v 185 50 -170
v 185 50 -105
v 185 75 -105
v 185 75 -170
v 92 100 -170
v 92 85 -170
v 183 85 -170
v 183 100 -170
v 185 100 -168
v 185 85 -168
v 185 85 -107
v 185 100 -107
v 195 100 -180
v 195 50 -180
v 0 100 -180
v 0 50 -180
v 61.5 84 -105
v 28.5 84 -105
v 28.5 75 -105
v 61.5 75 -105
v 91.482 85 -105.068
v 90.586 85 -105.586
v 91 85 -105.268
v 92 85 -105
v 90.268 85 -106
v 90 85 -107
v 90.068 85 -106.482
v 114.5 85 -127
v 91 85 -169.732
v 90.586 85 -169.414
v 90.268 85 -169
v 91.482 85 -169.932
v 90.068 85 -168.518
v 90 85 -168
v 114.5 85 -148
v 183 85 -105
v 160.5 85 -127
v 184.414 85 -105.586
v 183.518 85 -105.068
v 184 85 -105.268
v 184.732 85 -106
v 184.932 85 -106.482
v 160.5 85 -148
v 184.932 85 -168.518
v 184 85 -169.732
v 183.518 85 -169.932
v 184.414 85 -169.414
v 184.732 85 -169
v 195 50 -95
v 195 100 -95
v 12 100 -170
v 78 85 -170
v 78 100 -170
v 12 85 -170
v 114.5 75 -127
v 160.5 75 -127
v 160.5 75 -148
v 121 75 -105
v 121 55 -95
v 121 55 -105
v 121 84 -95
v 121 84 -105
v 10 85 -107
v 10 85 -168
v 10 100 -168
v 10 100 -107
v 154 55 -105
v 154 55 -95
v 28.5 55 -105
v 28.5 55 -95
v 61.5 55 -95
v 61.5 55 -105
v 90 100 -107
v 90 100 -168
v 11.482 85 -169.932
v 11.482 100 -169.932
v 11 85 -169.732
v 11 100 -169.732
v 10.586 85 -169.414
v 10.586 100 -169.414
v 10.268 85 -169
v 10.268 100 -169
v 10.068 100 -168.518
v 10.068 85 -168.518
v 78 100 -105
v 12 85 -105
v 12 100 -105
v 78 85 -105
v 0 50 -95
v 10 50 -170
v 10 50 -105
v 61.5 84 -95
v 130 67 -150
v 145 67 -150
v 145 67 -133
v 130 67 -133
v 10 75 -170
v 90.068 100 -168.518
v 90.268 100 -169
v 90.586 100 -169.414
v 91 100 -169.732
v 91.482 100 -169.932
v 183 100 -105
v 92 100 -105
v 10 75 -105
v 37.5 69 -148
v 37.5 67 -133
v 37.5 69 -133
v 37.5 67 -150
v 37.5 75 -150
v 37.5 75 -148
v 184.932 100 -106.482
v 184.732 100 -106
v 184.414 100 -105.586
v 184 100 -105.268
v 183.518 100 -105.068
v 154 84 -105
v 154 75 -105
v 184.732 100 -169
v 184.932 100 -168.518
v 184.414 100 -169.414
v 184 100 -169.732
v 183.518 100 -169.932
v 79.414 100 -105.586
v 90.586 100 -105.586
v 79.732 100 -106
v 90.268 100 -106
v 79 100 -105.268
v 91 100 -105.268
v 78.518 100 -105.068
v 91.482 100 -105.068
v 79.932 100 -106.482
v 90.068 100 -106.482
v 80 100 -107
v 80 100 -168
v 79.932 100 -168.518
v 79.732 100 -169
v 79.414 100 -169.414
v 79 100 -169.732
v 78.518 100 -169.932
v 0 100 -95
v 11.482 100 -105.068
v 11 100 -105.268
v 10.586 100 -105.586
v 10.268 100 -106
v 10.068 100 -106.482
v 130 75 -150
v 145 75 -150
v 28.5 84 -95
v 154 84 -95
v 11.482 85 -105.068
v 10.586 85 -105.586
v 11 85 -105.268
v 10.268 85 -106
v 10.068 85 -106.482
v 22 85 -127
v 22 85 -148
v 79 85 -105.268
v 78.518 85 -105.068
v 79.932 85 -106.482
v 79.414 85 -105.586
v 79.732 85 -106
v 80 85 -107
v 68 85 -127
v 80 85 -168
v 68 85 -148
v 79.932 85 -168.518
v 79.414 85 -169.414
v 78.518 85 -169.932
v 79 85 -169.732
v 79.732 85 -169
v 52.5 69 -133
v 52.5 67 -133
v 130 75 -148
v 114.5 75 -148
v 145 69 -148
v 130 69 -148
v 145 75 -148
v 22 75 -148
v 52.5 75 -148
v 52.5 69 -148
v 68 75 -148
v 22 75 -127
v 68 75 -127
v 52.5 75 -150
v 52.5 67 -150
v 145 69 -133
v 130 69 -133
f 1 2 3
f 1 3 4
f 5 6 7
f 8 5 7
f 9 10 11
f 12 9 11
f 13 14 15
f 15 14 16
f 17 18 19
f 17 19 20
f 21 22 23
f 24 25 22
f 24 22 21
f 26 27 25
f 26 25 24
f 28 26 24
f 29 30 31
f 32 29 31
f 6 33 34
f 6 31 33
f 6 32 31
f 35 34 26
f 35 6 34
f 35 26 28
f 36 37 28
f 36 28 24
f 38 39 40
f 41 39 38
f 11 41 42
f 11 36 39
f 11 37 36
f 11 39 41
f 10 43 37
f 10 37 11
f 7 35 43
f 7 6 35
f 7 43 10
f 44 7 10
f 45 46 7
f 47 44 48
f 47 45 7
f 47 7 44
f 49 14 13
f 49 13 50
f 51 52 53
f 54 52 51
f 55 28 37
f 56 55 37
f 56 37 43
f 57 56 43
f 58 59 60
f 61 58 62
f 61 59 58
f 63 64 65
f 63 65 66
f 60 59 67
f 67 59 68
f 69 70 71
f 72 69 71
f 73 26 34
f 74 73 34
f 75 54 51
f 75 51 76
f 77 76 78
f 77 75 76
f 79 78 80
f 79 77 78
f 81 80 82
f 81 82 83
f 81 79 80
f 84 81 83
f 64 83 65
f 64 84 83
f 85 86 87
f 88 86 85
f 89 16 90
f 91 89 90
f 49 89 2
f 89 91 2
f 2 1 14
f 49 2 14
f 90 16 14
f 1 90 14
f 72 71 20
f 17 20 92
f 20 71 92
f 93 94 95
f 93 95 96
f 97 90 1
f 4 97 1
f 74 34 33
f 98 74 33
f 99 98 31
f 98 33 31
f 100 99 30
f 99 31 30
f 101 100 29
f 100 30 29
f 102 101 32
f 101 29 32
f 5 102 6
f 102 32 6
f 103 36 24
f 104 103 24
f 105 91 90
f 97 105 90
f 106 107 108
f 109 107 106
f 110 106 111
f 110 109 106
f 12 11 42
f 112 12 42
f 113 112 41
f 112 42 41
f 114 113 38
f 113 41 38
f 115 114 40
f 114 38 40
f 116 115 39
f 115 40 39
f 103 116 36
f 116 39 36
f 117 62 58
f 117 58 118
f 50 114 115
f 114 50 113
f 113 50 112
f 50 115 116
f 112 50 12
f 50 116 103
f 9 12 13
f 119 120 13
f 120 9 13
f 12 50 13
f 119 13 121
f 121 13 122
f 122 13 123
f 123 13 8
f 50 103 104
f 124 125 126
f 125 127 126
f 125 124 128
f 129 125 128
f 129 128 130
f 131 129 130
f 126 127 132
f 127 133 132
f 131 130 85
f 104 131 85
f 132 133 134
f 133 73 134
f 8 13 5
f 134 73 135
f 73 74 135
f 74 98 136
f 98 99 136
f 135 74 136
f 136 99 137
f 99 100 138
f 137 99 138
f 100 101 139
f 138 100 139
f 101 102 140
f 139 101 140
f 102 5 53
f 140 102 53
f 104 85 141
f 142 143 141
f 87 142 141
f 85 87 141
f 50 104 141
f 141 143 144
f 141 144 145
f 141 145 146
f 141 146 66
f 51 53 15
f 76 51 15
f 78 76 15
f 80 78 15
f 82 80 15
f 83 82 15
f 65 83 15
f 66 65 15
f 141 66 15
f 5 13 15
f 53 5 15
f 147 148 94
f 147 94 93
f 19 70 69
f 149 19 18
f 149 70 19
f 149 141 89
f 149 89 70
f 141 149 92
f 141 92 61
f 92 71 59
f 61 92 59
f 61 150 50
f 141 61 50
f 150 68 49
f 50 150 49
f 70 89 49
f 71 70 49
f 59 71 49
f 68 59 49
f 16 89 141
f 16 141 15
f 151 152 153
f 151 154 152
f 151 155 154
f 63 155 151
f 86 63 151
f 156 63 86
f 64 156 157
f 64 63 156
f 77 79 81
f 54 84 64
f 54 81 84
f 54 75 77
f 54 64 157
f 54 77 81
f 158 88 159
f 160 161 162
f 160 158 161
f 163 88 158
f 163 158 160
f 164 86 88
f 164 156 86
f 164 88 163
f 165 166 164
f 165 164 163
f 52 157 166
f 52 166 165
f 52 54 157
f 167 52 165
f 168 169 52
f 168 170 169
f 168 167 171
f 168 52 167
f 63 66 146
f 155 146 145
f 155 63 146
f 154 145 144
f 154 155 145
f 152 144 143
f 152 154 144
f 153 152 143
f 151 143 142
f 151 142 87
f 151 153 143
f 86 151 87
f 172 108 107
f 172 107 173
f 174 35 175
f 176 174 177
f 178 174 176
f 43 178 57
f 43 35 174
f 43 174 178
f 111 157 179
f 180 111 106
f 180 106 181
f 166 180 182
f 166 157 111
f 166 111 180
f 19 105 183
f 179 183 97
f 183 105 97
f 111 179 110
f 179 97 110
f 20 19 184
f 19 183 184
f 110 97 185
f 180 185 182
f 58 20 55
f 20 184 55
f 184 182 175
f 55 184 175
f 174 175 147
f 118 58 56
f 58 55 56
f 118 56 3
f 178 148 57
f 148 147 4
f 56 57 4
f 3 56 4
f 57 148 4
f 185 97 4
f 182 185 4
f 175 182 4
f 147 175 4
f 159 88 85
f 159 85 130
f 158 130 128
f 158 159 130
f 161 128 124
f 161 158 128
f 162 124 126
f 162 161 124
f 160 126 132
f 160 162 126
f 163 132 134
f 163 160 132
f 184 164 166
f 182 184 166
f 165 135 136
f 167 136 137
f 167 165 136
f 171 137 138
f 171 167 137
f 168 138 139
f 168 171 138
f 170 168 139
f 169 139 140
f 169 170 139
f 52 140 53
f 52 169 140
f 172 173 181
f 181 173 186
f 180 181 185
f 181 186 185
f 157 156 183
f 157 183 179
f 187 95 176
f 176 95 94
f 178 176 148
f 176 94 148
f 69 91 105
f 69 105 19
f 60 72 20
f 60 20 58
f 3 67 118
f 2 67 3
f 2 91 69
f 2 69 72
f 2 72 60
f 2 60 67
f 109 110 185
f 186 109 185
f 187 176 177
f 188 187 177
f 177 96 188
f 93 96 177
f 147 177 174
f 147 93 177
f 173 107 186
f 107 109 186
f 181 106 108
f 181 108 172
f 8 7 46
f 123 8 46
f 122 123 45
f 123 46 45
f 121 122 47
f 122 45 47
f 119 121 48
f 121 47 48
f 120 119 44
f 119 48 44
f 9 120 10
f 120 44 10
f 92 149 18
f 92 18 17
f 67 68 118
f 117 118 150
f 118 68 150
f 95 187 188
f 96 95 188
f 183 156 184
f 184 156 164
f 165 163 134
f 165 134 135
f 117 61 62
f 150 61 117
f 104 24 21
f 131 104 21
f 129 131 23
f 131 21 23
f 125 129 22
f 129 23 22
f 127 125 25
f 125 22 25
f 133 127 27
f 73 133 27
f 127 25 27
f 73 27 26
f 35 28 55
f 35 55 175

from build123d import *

# Parameters (mm, degrees)
SKETCH2_W            = 195
SKETCH2_H            = 180
BOSS_EXTRUDE1_DEPTH  = 50
CUT_EXTRUDE1_DEPTH   = 15
BOSS_EXTRUDE4_DEPTH  = 50
SKETCH14_W           = 70
SKETCH14_H           = 65
SKETCH14_W_2         = 95
BOSS_EXTRUDE8_DEPTH  = 35
SHELL2_OUTLINE_W     = 175
SHELL2_OUTLINE_H     = 65
SHELL2_DEPTH         = 75
SHELL2_2_OUTLINE_W   = 175
SHELL2_2_OUTLINE_H   = 95
SHELL2_2_DEPTH       = 25
SHELL2_START         = 25
SHELL2_3_DEPTH       = 15
SKETCH15_W           = 46
SKETCH15_H           = 21
CUT_EXTRUDE2_DEPTH   = 30
SKETCH16_W           = 46
SKETCH16_H           = 21
CUT_EXTRUDE3_DEPTH   = 30
SKETCH17_W           = 7.5
SKETCH17_H           = 8
BOSS_EXTRUDE9_DEPTH  = 2
SKETCH18_W           = 15
SKETCH18_H           = 2
BOSS_EXTRUDE10_DEPTH = 15
SKETCH19_W           = 33
SKETCH19_H           = 29
CUT_EXTRUDE14_DEPTH  = 10


# Read off the part's stored shape, not the designer's step: Shell2
with BuildPart() as part:
    # Sketch2 → Boss-Extrude1 (new body)
    with BuildSketch(Plane(origin=(0, 0, 0), x_dir=(1, 0, 0), z_dir=(0, 1, 0))):
        with Locations((97.5, 90)):
            Rectangle(SKETCH2_W, SKETCH2_H)
    extrude(amount=BOSS_EXTRUDE1_DEPTH)

    # Sketch3 → Cut-Extrude1 (cut)
    with BuildSketch(Plane(origin=(0, 50, 0), x_dir=(1, 0, 0), z_dir=(0, 1, 0))):
        with BuildLine():
            Line((90, 12), (90, 73))
            ThreePointArc((90, 73), (90.585786438, 74.414213562), (92, 75))
            Line((92, 75), (183, 75))
            ThreePointArc((183, 75), (184.414213562, 74.414213562), (185, 73))
            Line((185, 73), (185, 12))
            ThreePointArc((185, 12), (184.414213562, 10.585786438), (183, 10))
            Line((183, 10), (92, 10))
            ThreePointArc((92, 10), (90.585786438, 10.585786438), (90, 12))
        make_face()
        with BuildLine():
            Line((12, 10), (78, 10))
            ThreePointArc((78, 10), (79.414213562, 10.585786438), (80, 12))
            Line((80, 12), (80, 73))
            ThreePointArc((80, 73), (79.414213562, 74.414213562), (78, 75))
            Line((78, 75), (12, 75))
            ThreePointArc((12, 75), (10.585786438, 74.414213562), (10, 73))
            Line((10, 73), (10, 12))
            ThreePointArc((10, 12), (10.585786438, 10.585786438), (12, 10))
        make_face()
    extrude(amount=-CUT_EXTRUDE1_DEPTH, mode=Mode.SUBTRACT)

    # Sketch6 → Boss-Extrude4 (add)
    with BuildSketch(Plane(origin=(0, 50, 0), x_dir=(1, 0, 0), z_dir=(0, 1, 0))):
        Polygon((0, 180), (185, 180), (195, 180), (195, 95), (185, 95), (0, 95), align=None)
        with BuildLine():
            Line((185, 168), (185, 107))
            ThreePointArc((185, 107), (184.414213562, 105.585786438), (183, 105))
            Line((183, 105), (92, 105))
            ThreePointArc((92, 105), (90.585786438, 105.585786438), (90, 107))
            Line((90, 107), (90, 168))
            ThreePointArc((90, 168), (90.585786438, 169.414213562), (92, 170))
            Line((92, 170), (183, 170))
            ThreePointArc((183, 170), (184.414213562, 169.414213562), (185, 168))
        make_face(mode=Mode.SUBTRACT)
        with BuildLine():
            Line((80, 107), (80, 168))
            ThreePointArc((80, 168), (79.414213562, 169.414213562), (78, 170))
            Line((78, 170), (12, 170))
            ThreePointArc((12, 170), (10.585786438, 169.414213562), (10, 168))
            Line((10, 168), (10, 107))
            ThreePointArc((10, 107), (10.585786438, 105.585786438), (12, 105))
            Line((12, 105), (78, 105))
            ThreePointArc((78, 105), (79.414213562, 105.585786438), (80, 107))
        make_face(mode=Mode.SUBTRACT)
    extrude(amount=BOSS_EXTRUDE4_DEPTH)

    # Sketch14 → Boss-Extrude8 (add)
    with BuildSketch(Plane(origin=(0, 50, 0), x_dir=(1, 0, 0), z_dir=(0, 1, 0))):
        with Locations((45, 137.5)):
            Rectangle(SKETCH14_W, SKETCH14_H)
        with Locations((137.5, 137.5)):
            Rectangle(SKETCH14_W_2, SKETCH14_H)
    extrude(amount=BOSS_EXTRUDE8_DEPTH)

    # Shell2 outline → Shell2 (cut)
    with BuildSketch(Plane(origin=(0, 0, 0), x_dir=(1, 0, 0), z_dir=(0, 1, 0))):
        with Locations((97.5, 137.5)):
            Rectangle(SHELL2_OUTLINE_W, SHELL2_OUTLINE_H)
    extrude(amount=SHELL2_DEPTH, mode=Mode.SUBTRACT)

    # Shell2 2 outline → Shell2 2 (cut)
    with BuildSketch(Plane(origin=(0, 0, 0), x_dir=(1, 0, 0), z_dir=(0, 1, 0))):
        with Locations((97.5, 57.5)):
            Rectangle(SHELL2_2_OUTLINE_W, SHELL2_2_OUTLINE_H)
    extrude(amount=SHELL2_2_DEPTH, mode=Mode.SUBTRACT)

    # Shell2 3 outline → Shell2 3 (cut)
    with BuildSketch(Plane(origin=(0, 0, 0), x_dir=(1, 0, 0), z_dir=(0, 1, 0)).offset(SHELL2_START)):
        with BuildLine():
            Line((10, 105), (10, 84.832159566))
            ThreePointArc((10, 84.832159566), (10.996484877, 84.957966273), (12, 85))
            Line((12, 85), (78, 85))
            ThreePointArc((78, 85), (81.676851089, 84.422817781), (85, 82.746794345))
            ThreePointArc((85, 82.746794345), (88.323148911, 84.422817781), (92, 85))
            Line((92, 85), (183, 85))
            ThreePointArc((183, 85), (184.003515123, 84.957966273), (185, 84.832159566))
            Line((185, 84.832159566), (185, 105))
            Line((185, 105), (10, 105))
        make_face()
    extrude(amount=SHELL2_3_DEPTH, mode=Mode.SUBTRACT)

    # SurfaceCut1
    split(bisect_by=Plane(origin=(0, 50, 0), x_dir=(1, 0, 0), z_dir=(0, 1, 0)), keep=Keep.TOP)

    # Sketch15 → Cut-Extrude2 (cut)
    with BuildSketch(Plane(origin=(0, 85, 0), x_dir=(1, 0, 0), z_dir=(0, 1, 0))):
        with Locations((45, 137.5)):
            Rectangle(SKETCH15_W, SKETCH15_H)
    extrude(amount=-CUT_EXTRUDE2_DEPTH, mode=Mode.SUBTRACT)

    # Sketch16 → Cut-Extrude3 (cut)
    with BuildSketch(Plane(origin=(0, 85, 0), x_dir=(1, 0, 0), z_dir=(0, 1, 0))):
        with Locations((137.5, 137.5)):
            Rectangle(SKETCH16_W, SKETCH16_H)
    extrude(amount=-CUT_EXTRUDE3_DEPTH, mode=Mode.SUBTRACT)

    # Sketch17 → Boss-Extrude9 (add)
    with BuildSketch(Plane.XY.offset(-148)):
        with Locations((41.25, 71)):
            Rectangle(SKETCH17_W, SKETCH17_H)
        with Locations((48.75, 71)):
            Rectangle(SKETCH17_W, SKETCH17_H)
    boss_extrude9 = extrude(amount=-BOSS_EXTRUDE9_DEPTH)

    # Sketch18 → Boss-Extrude10 (add)
    with BuildSketch(Plane.XY.offset(-148)):
        with Locations((45, 68)):
            Rectangle(SKETCH18_W, SKETCH18_H)
    boss_extrude10 = extrude(amount=BOSS_EXTRUDE10_DEPTH)

    # Mirror1: Boss-Extrude9, Boss-Extrude10 across plane
    add(boss_extrude9.mirror(Plane.ZY.offset(-91.25)))
    add(boss_extrude10.mirror(Plane.ZY.offset(-91.25)))

    # Sketch19 → Cut-Extrude14 (cut)
    with BuildSketch(Plane.XY.offset(-95)):
        with Locations((45, 69.5)):
            Rectangle(SKETCH19_W, SKETCH19_H)
        with Locations((137.5, 69.5)):
            Rectangle(SKETCH19_W, SKETCH19_H)
    extrude(amount=-CUT_EXTRUDE14_DEPTH, mode=Mode.SUBTRACT)


solid = part.part
